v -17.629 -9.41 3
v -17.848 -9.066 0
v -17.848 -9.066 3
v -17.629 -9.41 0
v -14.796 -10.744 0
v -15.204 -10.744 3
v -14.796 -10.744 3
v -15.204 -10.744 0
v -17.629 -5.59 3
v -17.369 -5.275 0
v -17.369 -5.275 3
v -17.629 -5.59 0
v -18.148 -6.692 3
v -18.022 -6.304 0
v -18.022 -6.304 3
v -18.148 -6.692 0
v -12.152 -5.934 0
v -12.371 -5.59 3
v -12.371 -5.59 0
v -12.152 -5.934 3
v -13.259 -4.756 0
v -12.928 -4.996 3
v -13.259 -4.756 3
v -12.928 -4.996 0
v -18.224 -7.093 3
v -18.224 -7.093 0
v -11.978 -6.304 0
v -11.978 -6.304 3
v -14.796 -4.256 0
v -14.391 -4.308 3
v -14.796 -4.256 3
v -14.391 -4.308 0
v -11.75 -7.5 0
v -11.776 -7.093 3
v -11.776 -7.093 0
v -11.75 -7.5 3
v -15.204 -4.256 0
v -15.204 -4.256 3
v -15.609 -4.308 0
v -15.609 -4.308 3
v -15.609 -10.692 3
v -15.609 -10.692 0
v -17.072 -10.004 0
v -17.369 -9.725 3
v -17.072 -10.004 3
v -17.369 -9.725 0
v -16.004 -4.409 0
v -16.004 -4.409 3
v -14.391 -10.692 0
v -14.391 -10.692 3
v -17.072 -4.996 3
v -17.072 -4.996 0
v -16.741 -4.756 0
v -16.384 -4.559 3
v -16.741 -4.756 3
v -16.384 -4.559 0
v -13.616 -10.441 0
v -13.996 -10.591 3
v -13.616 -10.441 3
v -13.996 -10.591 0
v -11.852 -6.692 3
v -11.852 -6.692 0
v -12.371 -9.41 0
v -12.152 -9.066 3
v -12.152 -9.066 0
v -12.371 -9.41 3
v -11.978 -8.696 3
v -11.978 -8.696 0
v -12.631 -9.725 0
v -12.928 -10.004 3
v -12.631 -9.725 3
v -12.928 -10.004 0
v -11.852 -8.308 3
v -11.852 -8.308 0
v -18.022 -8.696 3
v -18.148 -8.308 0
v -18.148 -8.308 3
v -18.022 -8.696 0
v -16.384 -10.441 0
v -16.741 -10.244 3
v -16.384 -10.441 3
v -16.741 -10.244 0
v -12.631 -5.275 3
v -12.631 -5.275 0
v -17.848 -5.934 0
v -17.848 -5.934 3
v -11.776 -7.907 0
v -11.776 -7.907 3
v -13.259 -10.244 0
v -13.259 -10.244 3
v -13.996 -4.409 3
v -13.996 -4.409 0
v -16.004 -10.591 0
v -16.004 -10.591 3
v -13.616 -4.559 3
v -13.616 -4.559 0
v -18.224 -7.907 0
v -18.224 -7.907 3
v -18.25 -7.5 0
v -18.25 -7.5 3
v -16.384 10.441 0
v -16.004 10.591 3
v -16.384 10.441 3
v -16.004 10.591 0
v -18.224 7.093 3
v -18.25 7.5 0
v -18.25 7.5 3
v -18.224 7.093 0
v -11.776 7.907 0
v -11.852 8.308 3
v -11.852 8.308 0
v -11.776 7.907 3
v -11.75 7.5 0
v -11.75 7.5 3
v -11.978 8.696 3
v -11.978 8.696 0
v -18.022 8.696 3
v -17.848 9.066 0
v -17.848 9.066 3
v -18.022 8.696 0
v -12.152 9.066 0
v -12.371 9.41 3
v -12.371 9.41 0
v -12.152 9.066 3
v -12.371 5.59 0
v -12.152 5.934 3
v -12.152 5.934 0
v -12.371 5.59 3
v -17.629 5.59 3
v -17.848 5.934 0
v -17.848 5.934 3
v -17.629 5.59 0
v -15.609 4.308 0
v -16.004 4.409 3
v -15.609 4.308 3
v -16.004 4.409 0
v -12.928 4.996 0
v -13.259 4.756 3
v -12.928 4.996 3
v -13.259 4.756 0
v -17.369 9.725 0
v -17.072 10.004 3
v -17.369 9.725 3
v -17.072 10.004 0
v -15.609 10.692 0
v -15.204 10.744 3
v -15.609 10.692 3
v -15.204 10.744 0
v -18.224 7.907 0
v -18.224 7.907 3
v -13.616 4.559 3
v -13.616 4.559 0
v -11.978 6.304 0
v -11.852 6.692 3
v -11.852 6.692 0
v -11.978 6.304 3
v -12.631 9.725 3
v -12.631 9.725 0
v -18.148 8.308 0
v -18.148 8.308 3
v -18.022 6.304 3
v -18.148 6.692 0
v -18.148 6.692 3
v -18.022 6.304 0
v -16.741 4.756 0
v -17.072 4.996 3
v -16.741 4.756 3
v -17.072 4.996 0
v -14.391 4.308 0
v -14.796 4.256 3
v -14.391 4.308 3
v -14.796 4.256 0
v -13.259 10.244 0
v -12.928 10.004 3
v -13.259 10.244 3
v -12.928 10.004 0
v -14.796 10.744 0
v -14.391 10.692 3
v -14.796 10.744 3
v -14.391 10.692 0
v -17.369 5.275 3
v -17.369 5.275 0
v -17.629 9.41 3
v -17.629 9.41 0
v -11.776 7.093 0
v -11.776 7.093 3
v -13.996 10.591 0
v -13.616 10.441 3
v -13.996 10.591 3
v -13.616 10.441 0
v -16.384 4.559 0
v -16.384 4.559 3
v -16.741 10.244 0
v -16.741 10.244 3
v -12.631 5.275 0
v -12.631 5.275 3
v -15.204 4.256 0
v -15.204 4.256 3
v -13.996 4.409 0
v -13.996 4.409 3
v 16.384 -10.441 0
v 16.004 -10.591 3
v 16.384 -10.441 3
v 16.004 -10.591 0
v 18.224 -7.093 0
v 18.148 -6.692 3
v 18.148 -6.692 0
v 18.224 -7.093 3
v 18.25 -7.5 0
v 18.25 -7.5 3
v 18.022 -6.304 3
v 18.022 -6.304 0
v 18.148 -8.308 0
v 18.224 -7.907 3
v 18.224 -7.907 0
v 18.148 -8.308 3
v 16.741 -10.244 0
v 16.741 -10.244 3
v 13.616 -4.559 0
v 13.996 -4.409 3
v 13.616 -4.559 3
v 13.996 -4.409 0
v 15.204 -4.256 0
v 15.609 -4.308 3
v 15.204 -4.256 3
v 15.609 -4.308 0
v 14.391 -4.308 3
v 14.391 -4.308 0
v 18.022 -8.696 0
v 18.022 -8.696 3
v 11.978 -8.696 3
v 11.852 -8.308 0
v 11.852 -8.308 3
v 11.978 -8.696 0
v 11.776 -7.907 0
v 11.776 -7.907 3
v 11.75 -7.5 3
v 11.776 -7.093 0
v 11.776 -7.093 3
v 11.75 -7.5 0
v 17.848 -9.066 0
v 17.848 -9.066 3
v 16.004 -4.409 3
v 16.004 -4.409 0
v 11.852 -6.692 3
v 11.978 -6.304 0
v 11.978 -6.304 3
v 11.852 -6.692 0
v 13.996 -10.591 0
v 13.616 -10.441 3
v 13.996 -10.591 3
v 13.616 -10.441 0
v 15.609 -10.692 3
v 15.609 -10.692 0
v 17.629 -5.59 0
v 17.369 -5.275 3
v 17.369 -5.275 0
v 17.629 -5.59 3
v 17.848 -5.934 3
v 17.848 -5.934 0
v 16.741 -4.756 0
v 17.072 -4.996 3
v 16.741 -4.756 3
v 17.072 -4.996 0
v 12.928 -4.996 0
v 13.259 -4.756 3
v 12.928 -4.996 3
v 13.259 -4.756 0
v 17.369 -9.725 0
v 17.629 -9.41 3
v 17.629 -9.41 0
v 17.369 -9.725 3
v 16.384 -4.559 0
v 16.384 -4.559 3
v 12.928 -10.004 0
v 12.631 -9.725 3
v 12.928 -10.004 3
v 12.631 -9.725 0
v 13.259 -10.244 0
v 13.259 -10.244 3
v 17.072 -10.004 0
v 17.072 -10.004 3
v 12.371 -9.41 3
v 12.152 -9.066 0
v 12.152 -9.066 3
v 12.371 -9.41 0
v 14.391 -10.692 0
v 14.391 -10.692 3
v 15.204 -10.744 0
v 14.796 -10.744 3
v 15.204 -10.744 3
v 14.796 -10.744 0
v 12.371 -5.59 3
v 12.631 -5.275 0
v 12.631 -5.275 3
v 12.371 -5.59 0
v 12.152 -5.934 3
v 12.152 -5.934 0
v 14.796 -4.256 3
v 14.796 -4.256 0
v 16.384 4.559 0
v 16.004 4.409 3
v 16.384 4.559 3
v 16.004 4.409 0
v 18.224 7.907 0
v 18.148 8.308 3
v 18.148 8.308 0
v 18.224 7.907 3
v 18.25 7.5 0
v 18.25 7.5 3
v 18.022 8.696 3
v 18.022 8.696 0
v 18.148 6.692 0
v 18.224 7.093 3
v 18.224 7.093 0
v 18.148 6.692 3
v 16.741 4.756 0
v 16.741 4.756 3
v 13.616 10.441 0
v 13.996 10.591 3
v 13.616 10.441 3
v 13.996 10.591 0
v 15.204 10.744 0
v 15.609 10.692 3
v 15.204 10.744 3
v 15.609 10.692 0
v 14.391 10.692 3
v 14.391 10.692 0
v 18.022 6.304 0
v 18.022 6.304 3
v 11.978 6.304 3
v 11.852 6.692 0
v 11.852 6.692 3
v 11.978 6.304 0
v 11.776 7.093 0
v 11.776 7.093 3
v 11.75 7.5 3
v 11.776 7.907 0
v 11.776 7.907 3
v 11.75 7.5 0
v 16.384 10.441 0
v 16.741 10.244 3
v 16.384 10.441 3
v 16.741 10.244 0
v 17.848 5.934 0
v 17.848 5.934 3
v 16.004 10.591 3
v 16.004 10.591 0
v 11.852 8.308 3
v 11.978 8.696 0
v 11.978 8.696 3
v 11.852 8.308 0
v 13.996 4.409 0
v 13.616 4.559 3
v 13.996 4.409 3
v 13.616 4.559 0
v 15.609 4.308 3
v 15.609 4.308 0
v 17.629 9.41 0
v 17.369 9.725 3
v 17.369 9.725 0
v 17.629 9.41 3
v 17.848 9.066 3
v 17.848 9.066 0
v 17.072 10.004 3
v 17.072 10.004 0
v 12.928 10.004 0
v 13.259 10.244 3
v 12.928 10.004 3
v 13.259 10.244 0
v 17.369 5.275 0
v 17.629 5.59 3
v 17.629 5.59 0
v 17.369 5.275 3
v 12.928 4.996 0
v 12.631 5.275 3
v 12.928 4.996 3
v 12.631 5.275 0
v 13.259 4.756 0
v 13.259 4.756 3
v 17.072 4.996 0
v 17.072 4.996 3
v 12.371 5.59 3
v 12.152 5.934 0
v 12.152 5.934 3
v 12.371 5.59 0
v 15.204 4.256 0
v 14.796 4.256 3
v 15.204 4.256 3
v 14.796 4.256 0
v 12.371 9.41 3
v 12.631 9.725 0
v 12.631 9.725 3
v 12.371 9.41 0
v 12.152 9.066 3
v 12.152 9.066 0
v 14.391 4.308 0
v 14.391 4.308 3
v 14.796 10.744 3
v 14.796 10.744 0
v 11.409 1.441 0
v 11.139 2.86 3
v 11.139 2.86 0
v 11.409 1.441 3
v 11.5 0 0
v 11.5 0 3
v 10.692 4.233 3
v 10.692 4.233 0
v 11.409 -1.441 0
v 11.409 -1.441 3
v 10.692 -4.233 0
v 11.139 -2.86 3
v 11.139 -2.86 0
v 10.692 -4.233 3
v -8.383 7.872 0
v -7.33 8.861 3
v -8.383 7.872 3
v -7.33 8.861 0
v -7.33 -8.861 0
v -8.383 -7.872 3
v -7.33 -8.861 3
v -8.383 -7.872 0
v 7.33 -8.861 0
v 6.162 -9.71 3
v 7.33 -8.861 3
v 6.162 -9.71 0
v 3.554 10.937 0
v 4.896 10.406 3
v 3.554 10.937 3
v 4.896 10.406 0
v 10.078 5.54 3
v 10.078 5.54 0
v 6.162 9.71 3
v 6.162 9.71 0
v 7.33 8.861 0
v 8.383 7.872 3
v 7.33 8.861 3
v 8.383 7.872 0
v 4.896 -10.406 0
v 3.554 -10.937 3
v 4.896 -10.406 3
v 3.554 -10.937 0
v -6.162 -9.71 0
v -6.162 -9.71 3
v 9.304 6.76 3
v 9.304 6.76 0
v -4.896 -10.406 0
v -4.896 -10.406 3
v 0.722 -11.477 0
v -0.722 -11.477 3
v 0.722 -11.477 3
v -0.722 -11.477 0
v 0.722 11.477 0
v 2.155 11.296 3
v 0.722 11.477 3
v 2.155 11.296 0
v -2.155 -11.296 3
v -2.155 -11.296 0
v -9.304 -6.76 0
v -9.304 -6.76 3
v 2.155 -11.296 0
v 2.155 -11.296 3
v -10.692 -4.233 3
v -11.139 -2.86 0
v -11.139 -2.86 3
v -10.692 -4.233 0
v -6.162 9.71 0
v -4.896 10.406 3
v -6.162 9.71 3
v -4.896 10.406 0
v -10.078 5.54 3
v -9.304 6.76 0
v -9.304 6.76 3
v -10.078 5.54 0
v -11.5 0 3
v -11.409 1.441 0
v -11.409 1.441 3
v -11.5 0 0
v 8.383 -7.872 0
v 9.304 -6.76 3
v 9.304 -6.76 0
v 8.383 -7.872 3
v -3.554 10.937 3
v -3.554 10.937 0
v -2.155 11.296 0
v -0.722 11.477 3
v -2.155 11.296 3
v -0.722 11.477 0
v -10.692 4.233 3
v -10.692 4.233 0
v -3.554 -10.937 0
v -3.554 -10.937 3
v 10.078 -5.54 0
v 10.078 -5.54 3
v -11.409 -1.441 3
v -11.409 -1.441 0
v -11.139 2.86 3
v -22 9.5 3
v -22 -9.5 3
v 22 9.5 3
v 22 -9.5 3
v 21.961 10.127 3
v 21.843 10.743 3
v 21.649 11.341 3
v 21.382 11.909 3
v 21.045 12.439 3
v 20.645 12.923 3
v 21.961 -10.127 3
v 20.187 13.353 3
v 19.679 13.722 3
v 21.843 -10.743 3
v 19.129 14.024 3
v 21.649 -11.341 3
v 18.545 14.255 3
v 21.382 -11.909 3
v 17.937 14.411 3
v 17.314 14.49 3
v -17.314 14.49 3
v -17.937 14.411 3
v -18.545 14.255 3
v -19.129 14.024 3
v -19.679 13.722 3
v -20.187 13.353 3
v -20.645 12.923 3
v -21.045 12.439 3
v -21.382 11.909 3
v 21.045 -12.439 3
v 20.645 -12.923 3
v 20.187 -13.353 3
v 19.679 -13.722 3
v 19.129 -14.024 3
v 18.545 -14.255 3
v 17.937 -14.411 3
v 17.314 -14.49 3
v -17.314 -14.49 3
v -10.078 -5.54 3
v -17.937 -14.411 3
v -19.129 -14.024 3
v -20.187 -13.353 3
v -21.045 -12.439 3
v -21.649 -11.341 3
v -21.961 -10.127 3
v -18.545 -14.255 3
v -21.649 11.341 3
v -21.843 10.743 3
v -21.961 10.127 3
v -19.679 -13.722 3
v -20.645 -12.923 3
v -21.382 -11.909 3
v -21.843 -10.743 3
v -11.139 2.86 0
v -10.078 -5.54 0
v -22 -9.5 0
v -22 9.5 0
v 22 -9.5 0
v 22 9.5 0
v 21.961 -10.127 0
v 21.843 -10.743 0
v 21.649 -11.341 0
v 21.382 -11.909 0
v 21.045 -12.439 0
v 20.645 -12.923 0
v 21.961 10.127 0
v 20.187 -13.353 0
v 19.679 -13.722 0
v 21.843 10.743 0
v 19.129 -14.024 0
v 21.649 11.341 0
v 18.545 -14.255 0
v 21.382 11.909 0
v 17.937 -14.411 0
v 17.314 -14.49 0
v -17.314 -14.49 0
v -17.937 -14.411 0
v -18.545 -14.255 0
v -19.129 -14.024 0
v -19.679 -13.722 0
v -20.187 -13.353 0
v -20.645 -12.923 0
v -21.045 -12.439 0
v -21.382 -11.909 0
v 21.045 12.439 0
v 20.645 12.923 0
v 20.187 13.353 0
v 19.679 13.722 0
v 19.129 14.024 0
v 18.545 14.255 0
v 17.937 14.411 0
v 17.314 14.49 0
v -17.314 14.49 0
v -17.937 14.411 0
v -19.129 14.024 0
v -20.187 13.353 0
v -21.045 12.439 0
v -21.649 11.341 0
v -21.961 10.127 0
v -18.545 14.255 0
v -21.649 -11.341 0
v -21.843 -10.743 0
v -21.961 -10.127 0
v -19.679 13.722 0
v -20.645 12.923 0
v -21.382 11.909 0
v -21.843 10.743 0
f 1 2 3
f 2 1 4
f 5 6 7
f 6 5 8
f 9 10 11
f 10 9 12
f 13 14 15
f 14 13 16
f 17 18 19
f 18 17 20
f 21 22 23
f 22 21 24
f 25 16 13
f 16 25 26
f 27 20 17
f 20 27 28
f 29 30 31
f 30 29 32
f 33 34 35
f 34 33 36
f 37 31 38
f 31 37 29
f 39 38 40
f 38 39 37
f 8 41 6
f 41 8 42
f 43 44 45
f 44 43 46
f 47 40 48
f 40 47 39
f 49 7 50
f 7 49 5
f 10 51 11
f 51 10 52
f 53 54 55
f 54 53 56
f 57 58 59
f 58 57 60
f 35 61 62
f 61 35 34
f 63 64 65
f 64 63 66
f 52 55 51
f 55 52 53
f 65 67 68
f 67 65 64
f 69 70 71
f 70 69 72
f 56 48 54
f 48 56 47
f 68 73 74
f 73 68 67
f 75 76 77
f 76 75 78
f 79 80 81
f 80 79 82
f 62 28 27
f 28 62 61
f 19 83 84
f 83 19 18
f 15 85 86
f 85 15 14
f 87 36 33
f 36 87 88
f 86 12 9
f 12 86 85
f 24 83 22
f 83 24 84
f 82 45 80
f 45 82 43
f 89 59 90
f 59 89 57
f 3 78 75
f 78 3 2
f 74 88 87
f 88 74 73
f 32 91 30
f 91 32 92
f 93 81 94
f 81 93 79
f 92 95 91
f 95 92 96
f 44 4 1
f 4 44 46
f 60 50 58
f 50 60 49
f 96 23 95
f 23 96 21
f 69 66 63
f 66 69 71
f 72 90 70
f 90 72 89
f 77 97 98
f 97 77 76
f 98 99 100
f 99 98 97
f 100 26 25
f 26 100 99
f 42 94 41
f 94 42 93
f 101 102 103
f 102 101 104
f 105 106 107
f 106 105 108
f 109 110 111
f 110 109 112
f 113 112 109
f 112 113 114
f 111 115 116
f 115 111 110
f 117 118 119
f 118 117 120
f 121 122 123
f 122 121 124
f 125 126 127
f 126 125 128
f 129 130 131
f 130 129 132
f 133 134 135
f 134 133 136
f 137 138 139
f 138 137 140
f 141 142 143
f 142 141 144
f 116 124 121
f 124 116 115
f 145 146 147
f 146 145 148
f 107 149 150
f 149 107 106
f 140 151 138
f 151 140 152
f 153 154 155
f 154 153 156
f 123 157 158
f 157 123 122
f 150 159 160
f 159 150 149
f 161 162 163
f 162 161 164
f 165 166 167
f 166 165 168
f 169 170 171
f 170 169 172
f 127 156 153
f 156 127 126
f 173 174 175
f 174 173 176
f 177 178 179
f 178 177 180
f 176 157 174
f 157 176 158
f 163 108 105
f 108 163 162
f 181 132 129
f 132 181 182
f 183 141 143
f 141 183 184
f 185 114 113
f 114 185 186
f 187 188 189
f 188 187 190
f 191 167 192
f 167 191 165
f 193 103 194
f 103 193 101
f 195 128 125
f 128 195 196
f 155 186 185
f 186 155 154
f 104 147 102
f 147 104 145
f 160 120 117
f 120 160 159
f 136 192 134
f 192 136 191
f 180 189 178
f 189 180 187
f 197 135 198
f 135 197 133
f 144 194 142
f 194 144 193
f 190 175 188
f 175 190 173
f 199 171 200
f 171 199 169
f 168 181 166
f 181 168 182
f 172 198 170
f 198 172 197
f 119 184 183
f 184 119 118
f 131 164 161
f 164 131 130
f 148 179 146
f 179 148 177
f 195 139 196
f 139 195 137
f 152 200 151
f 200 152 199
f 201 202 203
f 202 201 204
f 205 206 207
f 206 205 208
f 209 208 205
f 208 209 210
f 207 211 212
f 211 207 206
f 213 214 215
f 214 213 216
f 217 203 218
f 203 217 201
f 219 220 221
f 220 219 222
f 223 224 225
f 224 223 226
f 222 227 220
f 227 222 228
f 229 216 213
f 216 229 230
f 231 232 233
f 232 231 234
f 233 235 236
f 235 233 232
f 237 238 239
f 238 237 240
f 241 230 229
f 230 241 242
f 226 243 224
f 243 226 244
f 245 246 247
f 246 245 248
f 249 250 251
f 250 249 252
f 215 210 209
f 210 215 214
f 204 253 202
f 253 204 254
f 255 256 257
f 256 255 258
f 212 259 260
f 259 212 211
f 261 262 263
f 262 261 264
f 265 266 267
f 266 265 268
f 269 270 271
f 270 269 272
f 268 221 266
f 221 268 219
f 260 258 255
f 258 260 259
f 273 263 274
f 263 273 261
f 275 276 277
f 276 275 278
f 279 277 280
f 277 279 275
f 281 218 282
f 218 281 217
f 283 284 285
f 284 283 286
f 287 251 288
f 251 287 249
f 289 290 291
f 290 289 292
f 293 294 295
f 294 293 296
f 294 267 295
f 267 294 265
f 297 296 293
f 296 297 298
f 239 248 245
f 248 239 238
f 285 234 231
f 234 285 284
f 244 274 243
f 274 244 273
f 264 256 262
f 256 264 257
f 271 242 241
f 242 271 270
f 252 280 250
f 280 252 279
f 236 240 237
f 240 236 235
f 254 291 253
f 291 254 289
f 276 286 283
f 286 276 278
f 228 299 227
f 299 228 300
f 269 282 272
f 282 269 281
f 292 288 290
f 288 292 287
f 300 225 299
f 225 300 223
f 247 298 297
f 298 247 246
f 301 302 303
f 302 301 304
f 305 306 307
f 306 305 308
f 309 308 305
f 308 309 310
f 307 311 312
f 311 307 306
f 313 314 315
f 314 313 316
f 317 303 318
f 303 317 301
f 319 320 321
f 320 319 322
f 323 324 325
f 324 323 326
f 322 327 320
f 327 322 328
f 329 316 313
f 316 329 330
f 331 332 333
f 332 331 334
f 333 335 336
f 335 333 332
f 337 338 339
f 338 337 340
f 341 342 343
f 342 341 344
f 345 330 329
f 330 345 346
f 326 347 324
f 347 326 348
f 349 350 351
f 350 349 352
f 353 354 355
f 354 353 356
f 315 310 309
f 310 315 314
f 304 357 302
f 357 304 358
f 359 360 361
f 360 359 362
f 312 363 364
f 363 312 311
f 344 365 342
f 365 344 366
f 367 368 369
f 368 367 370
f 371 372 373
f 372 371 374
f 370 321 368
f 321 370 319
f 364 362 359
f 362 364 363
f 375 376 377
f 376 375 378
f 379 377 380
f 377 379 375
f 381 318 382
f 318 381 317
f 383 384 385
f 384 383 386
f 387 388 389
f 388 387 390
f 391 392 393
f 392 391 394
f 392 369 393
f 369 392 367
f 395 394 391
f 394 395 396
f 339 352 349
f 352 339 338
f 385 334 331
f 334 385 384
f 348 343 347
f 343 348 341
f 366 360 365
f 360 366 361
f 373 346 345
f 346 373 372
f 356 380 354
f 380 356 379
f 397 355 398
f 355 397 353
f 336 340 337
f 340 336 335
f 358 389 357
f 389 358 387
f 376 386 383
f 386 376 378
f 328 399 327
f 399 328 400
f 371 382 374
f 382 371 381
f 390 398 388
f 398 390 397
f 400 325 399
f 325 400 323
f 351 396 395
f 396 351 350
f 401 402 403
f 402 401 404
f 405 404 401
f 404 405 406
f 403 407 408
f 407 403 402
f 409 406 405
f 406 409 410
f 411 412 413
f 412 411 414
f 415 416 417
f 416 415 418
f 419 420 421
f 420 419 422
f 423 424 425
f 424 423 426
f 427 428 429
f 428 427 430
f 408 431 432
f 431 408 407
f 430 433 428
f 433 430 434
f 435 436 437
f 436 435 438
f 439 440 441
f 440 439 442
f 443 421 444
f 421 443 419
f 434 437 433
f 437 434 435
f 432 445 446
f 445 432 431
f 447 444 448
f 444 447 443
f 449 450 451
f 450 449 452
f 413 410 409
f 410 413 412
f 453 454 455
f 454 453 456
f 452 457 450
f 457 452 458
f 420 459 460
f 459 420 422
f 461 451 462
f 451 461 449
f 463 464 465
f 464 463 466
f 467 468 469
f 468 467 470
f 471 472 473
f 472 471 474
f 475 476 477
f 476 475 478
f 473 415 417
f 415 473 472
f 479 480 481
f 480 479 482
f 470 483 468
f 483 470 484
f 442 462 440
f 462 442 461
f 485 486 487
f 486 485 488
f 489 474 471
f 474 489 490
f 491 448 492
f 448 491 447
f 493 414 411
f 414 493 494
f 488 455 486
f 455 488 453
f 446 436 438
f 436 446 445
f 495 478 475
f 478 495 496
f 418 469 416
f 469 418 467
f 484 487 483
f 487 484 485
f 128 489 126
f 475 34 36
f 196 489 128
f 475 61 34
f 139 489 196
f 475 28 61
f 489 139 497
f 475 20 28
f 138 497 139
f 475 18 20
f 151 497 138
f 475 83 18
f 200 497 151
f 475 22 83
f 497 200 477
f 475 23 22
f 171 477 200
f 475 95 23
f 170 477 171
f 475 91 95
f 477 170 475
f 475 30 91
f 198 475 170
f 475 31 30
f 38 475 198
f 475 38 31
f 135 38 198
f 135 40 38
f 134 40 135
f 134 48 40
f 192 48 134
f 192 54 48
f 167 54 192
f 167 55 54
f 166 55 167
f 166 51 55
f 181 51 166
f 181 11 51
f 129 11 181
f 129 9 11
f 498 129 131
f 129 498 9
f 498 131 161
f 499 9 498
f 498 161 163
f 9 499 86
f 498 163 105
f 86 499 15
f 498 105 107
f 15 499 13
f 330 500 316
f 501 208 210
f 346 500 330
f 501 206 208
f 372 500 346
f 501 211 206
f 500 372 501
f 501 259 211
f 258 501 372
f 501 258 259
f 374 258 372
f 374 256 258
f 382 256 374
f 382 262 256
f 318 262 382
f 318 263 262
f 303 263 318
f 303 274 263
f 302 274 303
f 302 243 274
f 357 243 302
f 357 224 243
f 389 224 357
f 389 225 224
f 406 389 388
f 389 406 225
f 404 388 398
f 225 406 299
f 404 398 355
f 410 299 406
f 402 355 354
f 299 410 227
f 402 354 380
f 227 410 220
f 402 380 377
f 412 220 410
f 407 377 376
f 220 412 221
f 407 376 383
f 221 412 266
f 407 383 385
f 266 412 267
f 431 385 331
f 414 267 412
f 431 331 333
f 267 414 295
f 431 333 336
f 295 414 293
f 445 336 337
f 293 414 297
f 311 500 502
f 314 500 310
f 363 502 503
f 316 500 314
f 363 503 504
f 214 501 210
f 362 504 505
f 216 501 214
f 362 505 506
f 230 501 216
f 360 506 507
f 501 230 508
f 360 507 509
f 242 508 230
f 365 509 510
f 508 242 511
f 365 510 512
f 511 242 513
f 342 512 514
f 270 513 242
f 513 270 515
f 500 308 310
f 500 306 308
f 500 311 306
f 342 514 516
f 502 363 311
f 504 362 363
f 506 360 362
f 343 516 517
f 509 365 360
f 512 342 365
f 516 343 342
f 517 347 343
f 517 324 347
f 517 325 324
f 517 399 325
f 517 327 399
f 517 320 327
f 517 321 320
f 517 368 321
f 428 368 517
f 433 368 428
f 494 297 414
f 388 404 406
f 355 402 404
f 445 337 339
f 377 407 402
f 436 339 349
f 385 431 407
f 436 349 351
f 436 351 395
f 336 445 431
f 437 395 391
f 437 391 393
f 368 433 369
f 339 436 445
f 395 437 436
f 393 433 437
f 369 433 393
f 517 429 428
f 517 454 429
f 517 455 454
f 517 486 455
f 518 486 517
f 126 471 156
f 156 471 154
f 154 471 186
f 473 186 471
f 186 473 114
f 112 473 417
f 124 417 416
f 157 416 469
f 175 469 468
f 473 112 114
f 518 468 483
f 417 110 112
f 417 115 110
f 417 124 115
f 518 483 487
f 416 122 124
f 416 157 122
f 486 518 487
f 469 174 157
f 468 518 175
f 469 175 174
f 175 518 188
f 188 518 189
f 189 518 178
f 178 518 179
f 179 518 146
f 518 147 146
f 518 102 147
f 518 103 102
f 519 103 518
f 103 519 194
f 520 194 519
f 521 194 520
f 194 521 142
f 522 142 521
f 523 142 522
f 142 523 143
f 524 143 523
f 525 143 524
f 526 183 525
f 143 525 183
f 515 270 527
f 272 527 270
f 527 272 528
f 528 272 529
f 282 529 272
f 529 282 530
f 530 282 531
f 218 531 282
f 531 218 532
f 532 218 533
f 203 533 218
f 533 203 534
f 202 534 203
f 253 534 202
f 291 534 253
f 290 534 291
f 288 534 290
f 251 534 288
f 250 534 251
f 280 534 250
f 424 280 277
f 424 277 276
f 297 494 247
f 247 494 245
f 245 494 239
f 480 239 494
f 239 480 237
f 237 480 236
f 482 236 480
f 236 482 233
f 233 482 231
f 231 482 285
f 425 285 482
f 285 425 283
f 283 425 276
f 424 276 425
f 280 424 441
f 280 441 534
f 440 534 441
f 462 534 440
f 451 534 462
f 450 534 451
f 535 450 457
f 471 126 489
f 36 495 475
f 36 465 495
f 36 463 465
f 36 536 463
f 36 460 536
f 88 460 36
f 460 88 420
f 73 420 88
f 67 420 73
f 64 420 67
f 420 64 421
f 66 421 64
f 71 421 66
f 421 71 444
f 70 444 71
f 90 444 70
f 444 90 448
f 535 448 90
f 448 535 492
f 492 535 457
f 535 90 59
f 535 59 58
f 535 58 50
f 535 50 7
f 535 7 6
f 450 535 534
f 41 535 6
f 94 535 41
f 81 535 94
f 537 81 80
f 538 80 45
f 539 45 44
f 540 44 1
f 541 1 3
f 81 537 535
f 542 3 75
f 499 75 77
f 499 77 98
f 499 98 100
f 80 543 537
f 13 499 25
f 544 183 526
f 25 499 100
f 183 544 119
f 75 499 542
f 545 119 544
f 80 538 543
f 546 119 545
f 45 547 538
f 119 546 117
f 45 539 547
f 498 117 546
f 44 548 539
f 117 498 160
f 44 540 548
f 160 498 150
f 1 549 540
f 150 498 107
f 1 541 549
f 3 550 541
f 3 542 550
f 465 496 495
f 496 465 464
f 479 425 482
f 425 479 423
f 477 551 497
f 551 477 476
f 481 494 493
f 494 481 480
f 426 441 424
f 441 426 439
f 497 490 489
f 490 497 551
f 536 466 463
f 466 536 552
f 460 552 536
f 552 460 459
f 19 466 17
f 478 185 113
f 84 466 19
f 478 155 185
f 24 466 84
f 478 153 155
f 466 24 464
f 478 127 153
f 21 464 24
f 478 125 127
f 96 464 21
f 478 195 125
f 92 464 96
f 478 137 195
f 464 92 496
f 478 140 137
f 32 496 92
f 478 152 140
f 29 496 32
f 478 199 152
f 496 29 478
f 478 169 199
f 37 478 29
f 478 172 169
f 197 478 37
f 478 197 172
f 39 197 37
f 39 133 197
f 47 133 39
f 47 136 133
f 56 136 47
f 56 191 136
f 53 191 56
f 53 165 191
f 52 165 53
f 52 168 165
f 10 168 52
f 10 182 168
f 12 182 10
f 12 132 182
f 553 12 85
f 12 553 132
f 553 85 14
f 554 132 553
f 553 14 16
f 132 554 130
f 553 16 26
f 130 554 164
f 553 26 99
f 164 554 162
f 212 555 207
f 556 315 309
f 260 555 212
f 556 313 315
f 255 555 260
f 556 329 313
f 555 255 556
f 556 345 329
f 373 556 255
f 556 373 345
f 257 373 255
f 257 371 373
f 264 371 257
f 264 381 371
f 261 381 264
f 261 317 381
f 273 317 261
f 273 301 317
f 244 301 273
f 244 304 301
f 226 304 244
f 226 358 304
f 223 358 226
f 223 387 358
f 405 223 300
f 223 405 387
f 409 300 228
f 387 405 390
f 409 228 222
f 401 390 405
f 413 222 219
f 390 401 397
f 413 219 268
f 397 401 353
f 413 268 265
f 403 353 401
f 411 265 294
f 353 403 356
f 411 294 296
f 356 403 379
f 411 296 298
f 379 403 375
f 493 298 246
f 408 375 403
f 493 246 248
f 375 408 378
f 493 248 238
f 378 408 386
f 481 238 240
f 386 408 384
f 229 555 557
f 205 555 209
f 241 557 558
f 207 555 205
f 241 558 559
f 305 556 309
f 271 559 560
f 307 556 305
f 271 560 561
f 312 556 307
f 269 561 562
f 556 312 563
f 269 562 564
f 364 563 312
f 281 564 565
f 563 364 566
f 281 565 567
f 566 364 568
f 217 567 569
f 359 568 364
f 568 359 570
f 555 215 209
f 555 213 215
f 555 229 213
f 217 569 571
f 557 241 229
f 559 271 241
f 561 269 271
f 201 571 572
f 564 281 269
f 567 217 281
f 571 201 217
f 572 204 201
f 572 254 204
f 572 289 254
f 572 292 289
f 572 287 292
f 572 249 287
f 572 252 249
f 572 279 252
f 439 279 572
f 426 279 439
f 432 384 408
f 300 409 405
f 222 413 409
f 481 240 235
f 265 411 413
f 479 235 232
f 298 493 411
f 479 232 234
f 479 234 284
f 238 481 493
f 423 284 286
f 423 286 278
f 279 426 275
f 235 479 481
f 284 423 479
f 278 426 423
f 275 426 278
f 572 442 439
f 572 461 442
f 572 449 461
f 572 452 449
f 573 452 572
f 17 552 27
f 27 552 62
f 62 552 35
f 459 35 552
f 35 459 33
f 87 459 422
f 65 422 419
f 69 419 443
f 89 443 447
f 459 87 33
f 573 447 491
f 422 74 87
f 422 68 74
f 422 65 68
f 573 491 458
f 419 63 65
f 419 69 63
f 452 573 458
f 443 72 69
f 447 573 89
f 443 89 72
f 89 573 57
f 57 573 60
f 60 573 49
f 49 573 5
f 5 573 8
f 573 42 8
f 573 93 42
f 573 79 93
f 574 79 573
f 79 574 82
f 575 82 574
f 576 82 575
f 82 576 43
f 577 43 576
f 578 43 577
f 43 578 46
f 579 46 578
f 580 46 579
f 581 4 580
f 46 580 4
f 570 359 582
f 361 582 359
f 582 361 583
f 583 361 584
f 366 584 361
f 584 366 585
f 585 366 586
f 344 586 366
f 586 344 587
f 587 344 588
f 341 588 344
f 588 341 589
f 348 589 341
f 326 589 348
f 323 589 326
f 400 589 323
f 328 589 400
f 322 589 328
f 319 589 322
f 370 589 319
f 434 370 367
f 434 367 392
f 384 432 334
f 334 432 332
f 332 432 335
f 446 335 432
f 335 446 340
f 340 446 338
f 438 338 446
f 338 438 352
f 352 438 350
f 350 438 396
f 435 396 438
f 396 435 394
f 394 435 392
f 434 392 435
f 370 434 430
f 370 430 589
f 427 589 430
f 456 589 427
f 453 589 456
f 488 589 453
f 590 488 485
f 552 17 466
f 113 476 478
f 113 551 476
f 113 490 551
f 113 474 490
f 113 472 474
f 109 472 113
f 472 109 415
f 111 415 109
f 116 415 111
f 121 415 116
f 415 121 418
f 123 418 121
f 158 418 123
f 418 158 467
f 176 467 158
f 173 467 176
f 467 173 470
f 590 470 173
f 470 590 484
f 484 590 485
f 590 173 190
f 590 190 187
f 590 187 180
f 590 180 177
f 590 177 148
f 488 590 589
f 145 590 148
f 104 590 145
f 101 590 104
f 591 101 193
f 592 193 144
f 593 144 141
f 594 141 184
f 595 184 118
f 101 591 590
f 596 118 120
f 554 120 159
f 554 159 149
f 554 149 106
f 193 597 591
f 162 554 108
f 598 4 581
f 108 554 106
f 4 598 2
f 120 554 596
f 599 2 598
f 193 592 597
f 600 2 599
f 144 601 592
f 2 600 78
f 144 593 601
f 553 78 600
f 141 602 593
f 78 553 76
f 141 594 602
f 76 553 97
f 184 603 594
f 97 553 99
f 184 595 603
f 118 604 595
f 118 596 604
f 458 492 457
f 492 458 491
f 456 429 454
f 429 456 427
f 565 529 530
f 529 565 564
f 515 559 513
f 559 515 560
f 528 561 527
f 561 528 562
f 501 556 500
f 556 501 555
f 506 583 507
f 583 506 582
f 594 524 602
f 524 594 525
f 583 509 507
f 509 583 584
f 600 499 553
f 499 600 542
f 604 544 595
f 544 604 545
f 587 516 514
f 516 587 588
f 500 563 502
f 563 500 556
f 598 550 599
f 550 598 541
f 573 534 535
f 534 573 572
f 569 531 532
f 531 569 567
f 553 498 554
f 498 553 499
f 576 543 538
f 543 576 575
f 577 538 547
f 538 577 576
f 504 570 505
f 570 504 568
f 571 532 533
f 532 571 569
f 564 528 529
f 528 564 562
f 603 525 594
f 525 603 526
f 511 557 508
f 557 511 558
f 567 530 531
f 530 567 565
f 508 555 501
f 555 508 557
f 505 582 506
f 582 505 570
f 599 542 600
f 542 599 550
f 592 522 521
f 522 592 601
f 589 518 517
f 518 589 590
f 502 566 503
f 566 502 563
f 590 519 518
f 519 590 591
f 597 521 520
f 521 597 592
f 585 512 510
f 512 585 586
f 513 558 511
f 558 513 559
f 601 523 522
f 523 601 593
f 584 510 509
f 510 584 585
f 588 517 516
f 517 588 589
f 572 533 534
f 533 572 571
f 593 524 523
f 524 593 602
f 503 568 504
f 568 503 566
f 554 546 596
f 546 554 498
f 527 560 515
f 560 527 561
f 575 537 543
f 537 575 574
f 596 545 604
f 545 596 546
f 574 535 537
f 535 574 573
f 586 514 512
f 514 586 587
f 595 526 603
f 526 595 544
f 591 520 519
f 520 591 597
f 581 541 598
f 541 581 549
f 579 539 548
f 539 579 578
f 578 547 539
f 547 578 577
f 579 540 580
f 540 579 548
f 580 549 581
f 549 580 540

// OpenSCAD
$fn = 50;


difference() {
	union() {
		hull() {
			translate(v = [-17.0000000000, 9.5000000000, 0]) {
				cylinder(h = 3, r = 5);
			}
			translate(v = [17.0000000000, 9.5000000000, 0]) {
				cylinder(h = 3, r = 5);
			}
			translate(v = [-17.0000000000, -9.5000000000, 0]) {
				cylinder(h = 3, r = 5);
			}
			translate(v = [17.0000000000, -9.5000000000, 0]) {
				cylinder(h = 3, r = 5);
			}
		}
	}
	union() {
		#translate(v = [-15.0000000000, -7.5000000000, -100.0000000000]) {
			cylinder(h = 200, r = 3.2500000000);
		}
		#translate(v = [-15.0000000000, 7.5000000000, -100.0000000000]) {
			cylinder(h = 200, r = 3.2500000000);
		}
		#translate(v = [15.0000000000, -7.5000000000, -100.0000000000]) {
			cylinder(h = 200, r = 3.2500000000);
		}
		#translate(v = [15.0000000000, 7.5000000000, -100.0000000000]) {
			cylinder(h = 200, r = 3.2500000000);
		}
		#cylinder(h = 3, r = 11.5000000000);
	}
}
